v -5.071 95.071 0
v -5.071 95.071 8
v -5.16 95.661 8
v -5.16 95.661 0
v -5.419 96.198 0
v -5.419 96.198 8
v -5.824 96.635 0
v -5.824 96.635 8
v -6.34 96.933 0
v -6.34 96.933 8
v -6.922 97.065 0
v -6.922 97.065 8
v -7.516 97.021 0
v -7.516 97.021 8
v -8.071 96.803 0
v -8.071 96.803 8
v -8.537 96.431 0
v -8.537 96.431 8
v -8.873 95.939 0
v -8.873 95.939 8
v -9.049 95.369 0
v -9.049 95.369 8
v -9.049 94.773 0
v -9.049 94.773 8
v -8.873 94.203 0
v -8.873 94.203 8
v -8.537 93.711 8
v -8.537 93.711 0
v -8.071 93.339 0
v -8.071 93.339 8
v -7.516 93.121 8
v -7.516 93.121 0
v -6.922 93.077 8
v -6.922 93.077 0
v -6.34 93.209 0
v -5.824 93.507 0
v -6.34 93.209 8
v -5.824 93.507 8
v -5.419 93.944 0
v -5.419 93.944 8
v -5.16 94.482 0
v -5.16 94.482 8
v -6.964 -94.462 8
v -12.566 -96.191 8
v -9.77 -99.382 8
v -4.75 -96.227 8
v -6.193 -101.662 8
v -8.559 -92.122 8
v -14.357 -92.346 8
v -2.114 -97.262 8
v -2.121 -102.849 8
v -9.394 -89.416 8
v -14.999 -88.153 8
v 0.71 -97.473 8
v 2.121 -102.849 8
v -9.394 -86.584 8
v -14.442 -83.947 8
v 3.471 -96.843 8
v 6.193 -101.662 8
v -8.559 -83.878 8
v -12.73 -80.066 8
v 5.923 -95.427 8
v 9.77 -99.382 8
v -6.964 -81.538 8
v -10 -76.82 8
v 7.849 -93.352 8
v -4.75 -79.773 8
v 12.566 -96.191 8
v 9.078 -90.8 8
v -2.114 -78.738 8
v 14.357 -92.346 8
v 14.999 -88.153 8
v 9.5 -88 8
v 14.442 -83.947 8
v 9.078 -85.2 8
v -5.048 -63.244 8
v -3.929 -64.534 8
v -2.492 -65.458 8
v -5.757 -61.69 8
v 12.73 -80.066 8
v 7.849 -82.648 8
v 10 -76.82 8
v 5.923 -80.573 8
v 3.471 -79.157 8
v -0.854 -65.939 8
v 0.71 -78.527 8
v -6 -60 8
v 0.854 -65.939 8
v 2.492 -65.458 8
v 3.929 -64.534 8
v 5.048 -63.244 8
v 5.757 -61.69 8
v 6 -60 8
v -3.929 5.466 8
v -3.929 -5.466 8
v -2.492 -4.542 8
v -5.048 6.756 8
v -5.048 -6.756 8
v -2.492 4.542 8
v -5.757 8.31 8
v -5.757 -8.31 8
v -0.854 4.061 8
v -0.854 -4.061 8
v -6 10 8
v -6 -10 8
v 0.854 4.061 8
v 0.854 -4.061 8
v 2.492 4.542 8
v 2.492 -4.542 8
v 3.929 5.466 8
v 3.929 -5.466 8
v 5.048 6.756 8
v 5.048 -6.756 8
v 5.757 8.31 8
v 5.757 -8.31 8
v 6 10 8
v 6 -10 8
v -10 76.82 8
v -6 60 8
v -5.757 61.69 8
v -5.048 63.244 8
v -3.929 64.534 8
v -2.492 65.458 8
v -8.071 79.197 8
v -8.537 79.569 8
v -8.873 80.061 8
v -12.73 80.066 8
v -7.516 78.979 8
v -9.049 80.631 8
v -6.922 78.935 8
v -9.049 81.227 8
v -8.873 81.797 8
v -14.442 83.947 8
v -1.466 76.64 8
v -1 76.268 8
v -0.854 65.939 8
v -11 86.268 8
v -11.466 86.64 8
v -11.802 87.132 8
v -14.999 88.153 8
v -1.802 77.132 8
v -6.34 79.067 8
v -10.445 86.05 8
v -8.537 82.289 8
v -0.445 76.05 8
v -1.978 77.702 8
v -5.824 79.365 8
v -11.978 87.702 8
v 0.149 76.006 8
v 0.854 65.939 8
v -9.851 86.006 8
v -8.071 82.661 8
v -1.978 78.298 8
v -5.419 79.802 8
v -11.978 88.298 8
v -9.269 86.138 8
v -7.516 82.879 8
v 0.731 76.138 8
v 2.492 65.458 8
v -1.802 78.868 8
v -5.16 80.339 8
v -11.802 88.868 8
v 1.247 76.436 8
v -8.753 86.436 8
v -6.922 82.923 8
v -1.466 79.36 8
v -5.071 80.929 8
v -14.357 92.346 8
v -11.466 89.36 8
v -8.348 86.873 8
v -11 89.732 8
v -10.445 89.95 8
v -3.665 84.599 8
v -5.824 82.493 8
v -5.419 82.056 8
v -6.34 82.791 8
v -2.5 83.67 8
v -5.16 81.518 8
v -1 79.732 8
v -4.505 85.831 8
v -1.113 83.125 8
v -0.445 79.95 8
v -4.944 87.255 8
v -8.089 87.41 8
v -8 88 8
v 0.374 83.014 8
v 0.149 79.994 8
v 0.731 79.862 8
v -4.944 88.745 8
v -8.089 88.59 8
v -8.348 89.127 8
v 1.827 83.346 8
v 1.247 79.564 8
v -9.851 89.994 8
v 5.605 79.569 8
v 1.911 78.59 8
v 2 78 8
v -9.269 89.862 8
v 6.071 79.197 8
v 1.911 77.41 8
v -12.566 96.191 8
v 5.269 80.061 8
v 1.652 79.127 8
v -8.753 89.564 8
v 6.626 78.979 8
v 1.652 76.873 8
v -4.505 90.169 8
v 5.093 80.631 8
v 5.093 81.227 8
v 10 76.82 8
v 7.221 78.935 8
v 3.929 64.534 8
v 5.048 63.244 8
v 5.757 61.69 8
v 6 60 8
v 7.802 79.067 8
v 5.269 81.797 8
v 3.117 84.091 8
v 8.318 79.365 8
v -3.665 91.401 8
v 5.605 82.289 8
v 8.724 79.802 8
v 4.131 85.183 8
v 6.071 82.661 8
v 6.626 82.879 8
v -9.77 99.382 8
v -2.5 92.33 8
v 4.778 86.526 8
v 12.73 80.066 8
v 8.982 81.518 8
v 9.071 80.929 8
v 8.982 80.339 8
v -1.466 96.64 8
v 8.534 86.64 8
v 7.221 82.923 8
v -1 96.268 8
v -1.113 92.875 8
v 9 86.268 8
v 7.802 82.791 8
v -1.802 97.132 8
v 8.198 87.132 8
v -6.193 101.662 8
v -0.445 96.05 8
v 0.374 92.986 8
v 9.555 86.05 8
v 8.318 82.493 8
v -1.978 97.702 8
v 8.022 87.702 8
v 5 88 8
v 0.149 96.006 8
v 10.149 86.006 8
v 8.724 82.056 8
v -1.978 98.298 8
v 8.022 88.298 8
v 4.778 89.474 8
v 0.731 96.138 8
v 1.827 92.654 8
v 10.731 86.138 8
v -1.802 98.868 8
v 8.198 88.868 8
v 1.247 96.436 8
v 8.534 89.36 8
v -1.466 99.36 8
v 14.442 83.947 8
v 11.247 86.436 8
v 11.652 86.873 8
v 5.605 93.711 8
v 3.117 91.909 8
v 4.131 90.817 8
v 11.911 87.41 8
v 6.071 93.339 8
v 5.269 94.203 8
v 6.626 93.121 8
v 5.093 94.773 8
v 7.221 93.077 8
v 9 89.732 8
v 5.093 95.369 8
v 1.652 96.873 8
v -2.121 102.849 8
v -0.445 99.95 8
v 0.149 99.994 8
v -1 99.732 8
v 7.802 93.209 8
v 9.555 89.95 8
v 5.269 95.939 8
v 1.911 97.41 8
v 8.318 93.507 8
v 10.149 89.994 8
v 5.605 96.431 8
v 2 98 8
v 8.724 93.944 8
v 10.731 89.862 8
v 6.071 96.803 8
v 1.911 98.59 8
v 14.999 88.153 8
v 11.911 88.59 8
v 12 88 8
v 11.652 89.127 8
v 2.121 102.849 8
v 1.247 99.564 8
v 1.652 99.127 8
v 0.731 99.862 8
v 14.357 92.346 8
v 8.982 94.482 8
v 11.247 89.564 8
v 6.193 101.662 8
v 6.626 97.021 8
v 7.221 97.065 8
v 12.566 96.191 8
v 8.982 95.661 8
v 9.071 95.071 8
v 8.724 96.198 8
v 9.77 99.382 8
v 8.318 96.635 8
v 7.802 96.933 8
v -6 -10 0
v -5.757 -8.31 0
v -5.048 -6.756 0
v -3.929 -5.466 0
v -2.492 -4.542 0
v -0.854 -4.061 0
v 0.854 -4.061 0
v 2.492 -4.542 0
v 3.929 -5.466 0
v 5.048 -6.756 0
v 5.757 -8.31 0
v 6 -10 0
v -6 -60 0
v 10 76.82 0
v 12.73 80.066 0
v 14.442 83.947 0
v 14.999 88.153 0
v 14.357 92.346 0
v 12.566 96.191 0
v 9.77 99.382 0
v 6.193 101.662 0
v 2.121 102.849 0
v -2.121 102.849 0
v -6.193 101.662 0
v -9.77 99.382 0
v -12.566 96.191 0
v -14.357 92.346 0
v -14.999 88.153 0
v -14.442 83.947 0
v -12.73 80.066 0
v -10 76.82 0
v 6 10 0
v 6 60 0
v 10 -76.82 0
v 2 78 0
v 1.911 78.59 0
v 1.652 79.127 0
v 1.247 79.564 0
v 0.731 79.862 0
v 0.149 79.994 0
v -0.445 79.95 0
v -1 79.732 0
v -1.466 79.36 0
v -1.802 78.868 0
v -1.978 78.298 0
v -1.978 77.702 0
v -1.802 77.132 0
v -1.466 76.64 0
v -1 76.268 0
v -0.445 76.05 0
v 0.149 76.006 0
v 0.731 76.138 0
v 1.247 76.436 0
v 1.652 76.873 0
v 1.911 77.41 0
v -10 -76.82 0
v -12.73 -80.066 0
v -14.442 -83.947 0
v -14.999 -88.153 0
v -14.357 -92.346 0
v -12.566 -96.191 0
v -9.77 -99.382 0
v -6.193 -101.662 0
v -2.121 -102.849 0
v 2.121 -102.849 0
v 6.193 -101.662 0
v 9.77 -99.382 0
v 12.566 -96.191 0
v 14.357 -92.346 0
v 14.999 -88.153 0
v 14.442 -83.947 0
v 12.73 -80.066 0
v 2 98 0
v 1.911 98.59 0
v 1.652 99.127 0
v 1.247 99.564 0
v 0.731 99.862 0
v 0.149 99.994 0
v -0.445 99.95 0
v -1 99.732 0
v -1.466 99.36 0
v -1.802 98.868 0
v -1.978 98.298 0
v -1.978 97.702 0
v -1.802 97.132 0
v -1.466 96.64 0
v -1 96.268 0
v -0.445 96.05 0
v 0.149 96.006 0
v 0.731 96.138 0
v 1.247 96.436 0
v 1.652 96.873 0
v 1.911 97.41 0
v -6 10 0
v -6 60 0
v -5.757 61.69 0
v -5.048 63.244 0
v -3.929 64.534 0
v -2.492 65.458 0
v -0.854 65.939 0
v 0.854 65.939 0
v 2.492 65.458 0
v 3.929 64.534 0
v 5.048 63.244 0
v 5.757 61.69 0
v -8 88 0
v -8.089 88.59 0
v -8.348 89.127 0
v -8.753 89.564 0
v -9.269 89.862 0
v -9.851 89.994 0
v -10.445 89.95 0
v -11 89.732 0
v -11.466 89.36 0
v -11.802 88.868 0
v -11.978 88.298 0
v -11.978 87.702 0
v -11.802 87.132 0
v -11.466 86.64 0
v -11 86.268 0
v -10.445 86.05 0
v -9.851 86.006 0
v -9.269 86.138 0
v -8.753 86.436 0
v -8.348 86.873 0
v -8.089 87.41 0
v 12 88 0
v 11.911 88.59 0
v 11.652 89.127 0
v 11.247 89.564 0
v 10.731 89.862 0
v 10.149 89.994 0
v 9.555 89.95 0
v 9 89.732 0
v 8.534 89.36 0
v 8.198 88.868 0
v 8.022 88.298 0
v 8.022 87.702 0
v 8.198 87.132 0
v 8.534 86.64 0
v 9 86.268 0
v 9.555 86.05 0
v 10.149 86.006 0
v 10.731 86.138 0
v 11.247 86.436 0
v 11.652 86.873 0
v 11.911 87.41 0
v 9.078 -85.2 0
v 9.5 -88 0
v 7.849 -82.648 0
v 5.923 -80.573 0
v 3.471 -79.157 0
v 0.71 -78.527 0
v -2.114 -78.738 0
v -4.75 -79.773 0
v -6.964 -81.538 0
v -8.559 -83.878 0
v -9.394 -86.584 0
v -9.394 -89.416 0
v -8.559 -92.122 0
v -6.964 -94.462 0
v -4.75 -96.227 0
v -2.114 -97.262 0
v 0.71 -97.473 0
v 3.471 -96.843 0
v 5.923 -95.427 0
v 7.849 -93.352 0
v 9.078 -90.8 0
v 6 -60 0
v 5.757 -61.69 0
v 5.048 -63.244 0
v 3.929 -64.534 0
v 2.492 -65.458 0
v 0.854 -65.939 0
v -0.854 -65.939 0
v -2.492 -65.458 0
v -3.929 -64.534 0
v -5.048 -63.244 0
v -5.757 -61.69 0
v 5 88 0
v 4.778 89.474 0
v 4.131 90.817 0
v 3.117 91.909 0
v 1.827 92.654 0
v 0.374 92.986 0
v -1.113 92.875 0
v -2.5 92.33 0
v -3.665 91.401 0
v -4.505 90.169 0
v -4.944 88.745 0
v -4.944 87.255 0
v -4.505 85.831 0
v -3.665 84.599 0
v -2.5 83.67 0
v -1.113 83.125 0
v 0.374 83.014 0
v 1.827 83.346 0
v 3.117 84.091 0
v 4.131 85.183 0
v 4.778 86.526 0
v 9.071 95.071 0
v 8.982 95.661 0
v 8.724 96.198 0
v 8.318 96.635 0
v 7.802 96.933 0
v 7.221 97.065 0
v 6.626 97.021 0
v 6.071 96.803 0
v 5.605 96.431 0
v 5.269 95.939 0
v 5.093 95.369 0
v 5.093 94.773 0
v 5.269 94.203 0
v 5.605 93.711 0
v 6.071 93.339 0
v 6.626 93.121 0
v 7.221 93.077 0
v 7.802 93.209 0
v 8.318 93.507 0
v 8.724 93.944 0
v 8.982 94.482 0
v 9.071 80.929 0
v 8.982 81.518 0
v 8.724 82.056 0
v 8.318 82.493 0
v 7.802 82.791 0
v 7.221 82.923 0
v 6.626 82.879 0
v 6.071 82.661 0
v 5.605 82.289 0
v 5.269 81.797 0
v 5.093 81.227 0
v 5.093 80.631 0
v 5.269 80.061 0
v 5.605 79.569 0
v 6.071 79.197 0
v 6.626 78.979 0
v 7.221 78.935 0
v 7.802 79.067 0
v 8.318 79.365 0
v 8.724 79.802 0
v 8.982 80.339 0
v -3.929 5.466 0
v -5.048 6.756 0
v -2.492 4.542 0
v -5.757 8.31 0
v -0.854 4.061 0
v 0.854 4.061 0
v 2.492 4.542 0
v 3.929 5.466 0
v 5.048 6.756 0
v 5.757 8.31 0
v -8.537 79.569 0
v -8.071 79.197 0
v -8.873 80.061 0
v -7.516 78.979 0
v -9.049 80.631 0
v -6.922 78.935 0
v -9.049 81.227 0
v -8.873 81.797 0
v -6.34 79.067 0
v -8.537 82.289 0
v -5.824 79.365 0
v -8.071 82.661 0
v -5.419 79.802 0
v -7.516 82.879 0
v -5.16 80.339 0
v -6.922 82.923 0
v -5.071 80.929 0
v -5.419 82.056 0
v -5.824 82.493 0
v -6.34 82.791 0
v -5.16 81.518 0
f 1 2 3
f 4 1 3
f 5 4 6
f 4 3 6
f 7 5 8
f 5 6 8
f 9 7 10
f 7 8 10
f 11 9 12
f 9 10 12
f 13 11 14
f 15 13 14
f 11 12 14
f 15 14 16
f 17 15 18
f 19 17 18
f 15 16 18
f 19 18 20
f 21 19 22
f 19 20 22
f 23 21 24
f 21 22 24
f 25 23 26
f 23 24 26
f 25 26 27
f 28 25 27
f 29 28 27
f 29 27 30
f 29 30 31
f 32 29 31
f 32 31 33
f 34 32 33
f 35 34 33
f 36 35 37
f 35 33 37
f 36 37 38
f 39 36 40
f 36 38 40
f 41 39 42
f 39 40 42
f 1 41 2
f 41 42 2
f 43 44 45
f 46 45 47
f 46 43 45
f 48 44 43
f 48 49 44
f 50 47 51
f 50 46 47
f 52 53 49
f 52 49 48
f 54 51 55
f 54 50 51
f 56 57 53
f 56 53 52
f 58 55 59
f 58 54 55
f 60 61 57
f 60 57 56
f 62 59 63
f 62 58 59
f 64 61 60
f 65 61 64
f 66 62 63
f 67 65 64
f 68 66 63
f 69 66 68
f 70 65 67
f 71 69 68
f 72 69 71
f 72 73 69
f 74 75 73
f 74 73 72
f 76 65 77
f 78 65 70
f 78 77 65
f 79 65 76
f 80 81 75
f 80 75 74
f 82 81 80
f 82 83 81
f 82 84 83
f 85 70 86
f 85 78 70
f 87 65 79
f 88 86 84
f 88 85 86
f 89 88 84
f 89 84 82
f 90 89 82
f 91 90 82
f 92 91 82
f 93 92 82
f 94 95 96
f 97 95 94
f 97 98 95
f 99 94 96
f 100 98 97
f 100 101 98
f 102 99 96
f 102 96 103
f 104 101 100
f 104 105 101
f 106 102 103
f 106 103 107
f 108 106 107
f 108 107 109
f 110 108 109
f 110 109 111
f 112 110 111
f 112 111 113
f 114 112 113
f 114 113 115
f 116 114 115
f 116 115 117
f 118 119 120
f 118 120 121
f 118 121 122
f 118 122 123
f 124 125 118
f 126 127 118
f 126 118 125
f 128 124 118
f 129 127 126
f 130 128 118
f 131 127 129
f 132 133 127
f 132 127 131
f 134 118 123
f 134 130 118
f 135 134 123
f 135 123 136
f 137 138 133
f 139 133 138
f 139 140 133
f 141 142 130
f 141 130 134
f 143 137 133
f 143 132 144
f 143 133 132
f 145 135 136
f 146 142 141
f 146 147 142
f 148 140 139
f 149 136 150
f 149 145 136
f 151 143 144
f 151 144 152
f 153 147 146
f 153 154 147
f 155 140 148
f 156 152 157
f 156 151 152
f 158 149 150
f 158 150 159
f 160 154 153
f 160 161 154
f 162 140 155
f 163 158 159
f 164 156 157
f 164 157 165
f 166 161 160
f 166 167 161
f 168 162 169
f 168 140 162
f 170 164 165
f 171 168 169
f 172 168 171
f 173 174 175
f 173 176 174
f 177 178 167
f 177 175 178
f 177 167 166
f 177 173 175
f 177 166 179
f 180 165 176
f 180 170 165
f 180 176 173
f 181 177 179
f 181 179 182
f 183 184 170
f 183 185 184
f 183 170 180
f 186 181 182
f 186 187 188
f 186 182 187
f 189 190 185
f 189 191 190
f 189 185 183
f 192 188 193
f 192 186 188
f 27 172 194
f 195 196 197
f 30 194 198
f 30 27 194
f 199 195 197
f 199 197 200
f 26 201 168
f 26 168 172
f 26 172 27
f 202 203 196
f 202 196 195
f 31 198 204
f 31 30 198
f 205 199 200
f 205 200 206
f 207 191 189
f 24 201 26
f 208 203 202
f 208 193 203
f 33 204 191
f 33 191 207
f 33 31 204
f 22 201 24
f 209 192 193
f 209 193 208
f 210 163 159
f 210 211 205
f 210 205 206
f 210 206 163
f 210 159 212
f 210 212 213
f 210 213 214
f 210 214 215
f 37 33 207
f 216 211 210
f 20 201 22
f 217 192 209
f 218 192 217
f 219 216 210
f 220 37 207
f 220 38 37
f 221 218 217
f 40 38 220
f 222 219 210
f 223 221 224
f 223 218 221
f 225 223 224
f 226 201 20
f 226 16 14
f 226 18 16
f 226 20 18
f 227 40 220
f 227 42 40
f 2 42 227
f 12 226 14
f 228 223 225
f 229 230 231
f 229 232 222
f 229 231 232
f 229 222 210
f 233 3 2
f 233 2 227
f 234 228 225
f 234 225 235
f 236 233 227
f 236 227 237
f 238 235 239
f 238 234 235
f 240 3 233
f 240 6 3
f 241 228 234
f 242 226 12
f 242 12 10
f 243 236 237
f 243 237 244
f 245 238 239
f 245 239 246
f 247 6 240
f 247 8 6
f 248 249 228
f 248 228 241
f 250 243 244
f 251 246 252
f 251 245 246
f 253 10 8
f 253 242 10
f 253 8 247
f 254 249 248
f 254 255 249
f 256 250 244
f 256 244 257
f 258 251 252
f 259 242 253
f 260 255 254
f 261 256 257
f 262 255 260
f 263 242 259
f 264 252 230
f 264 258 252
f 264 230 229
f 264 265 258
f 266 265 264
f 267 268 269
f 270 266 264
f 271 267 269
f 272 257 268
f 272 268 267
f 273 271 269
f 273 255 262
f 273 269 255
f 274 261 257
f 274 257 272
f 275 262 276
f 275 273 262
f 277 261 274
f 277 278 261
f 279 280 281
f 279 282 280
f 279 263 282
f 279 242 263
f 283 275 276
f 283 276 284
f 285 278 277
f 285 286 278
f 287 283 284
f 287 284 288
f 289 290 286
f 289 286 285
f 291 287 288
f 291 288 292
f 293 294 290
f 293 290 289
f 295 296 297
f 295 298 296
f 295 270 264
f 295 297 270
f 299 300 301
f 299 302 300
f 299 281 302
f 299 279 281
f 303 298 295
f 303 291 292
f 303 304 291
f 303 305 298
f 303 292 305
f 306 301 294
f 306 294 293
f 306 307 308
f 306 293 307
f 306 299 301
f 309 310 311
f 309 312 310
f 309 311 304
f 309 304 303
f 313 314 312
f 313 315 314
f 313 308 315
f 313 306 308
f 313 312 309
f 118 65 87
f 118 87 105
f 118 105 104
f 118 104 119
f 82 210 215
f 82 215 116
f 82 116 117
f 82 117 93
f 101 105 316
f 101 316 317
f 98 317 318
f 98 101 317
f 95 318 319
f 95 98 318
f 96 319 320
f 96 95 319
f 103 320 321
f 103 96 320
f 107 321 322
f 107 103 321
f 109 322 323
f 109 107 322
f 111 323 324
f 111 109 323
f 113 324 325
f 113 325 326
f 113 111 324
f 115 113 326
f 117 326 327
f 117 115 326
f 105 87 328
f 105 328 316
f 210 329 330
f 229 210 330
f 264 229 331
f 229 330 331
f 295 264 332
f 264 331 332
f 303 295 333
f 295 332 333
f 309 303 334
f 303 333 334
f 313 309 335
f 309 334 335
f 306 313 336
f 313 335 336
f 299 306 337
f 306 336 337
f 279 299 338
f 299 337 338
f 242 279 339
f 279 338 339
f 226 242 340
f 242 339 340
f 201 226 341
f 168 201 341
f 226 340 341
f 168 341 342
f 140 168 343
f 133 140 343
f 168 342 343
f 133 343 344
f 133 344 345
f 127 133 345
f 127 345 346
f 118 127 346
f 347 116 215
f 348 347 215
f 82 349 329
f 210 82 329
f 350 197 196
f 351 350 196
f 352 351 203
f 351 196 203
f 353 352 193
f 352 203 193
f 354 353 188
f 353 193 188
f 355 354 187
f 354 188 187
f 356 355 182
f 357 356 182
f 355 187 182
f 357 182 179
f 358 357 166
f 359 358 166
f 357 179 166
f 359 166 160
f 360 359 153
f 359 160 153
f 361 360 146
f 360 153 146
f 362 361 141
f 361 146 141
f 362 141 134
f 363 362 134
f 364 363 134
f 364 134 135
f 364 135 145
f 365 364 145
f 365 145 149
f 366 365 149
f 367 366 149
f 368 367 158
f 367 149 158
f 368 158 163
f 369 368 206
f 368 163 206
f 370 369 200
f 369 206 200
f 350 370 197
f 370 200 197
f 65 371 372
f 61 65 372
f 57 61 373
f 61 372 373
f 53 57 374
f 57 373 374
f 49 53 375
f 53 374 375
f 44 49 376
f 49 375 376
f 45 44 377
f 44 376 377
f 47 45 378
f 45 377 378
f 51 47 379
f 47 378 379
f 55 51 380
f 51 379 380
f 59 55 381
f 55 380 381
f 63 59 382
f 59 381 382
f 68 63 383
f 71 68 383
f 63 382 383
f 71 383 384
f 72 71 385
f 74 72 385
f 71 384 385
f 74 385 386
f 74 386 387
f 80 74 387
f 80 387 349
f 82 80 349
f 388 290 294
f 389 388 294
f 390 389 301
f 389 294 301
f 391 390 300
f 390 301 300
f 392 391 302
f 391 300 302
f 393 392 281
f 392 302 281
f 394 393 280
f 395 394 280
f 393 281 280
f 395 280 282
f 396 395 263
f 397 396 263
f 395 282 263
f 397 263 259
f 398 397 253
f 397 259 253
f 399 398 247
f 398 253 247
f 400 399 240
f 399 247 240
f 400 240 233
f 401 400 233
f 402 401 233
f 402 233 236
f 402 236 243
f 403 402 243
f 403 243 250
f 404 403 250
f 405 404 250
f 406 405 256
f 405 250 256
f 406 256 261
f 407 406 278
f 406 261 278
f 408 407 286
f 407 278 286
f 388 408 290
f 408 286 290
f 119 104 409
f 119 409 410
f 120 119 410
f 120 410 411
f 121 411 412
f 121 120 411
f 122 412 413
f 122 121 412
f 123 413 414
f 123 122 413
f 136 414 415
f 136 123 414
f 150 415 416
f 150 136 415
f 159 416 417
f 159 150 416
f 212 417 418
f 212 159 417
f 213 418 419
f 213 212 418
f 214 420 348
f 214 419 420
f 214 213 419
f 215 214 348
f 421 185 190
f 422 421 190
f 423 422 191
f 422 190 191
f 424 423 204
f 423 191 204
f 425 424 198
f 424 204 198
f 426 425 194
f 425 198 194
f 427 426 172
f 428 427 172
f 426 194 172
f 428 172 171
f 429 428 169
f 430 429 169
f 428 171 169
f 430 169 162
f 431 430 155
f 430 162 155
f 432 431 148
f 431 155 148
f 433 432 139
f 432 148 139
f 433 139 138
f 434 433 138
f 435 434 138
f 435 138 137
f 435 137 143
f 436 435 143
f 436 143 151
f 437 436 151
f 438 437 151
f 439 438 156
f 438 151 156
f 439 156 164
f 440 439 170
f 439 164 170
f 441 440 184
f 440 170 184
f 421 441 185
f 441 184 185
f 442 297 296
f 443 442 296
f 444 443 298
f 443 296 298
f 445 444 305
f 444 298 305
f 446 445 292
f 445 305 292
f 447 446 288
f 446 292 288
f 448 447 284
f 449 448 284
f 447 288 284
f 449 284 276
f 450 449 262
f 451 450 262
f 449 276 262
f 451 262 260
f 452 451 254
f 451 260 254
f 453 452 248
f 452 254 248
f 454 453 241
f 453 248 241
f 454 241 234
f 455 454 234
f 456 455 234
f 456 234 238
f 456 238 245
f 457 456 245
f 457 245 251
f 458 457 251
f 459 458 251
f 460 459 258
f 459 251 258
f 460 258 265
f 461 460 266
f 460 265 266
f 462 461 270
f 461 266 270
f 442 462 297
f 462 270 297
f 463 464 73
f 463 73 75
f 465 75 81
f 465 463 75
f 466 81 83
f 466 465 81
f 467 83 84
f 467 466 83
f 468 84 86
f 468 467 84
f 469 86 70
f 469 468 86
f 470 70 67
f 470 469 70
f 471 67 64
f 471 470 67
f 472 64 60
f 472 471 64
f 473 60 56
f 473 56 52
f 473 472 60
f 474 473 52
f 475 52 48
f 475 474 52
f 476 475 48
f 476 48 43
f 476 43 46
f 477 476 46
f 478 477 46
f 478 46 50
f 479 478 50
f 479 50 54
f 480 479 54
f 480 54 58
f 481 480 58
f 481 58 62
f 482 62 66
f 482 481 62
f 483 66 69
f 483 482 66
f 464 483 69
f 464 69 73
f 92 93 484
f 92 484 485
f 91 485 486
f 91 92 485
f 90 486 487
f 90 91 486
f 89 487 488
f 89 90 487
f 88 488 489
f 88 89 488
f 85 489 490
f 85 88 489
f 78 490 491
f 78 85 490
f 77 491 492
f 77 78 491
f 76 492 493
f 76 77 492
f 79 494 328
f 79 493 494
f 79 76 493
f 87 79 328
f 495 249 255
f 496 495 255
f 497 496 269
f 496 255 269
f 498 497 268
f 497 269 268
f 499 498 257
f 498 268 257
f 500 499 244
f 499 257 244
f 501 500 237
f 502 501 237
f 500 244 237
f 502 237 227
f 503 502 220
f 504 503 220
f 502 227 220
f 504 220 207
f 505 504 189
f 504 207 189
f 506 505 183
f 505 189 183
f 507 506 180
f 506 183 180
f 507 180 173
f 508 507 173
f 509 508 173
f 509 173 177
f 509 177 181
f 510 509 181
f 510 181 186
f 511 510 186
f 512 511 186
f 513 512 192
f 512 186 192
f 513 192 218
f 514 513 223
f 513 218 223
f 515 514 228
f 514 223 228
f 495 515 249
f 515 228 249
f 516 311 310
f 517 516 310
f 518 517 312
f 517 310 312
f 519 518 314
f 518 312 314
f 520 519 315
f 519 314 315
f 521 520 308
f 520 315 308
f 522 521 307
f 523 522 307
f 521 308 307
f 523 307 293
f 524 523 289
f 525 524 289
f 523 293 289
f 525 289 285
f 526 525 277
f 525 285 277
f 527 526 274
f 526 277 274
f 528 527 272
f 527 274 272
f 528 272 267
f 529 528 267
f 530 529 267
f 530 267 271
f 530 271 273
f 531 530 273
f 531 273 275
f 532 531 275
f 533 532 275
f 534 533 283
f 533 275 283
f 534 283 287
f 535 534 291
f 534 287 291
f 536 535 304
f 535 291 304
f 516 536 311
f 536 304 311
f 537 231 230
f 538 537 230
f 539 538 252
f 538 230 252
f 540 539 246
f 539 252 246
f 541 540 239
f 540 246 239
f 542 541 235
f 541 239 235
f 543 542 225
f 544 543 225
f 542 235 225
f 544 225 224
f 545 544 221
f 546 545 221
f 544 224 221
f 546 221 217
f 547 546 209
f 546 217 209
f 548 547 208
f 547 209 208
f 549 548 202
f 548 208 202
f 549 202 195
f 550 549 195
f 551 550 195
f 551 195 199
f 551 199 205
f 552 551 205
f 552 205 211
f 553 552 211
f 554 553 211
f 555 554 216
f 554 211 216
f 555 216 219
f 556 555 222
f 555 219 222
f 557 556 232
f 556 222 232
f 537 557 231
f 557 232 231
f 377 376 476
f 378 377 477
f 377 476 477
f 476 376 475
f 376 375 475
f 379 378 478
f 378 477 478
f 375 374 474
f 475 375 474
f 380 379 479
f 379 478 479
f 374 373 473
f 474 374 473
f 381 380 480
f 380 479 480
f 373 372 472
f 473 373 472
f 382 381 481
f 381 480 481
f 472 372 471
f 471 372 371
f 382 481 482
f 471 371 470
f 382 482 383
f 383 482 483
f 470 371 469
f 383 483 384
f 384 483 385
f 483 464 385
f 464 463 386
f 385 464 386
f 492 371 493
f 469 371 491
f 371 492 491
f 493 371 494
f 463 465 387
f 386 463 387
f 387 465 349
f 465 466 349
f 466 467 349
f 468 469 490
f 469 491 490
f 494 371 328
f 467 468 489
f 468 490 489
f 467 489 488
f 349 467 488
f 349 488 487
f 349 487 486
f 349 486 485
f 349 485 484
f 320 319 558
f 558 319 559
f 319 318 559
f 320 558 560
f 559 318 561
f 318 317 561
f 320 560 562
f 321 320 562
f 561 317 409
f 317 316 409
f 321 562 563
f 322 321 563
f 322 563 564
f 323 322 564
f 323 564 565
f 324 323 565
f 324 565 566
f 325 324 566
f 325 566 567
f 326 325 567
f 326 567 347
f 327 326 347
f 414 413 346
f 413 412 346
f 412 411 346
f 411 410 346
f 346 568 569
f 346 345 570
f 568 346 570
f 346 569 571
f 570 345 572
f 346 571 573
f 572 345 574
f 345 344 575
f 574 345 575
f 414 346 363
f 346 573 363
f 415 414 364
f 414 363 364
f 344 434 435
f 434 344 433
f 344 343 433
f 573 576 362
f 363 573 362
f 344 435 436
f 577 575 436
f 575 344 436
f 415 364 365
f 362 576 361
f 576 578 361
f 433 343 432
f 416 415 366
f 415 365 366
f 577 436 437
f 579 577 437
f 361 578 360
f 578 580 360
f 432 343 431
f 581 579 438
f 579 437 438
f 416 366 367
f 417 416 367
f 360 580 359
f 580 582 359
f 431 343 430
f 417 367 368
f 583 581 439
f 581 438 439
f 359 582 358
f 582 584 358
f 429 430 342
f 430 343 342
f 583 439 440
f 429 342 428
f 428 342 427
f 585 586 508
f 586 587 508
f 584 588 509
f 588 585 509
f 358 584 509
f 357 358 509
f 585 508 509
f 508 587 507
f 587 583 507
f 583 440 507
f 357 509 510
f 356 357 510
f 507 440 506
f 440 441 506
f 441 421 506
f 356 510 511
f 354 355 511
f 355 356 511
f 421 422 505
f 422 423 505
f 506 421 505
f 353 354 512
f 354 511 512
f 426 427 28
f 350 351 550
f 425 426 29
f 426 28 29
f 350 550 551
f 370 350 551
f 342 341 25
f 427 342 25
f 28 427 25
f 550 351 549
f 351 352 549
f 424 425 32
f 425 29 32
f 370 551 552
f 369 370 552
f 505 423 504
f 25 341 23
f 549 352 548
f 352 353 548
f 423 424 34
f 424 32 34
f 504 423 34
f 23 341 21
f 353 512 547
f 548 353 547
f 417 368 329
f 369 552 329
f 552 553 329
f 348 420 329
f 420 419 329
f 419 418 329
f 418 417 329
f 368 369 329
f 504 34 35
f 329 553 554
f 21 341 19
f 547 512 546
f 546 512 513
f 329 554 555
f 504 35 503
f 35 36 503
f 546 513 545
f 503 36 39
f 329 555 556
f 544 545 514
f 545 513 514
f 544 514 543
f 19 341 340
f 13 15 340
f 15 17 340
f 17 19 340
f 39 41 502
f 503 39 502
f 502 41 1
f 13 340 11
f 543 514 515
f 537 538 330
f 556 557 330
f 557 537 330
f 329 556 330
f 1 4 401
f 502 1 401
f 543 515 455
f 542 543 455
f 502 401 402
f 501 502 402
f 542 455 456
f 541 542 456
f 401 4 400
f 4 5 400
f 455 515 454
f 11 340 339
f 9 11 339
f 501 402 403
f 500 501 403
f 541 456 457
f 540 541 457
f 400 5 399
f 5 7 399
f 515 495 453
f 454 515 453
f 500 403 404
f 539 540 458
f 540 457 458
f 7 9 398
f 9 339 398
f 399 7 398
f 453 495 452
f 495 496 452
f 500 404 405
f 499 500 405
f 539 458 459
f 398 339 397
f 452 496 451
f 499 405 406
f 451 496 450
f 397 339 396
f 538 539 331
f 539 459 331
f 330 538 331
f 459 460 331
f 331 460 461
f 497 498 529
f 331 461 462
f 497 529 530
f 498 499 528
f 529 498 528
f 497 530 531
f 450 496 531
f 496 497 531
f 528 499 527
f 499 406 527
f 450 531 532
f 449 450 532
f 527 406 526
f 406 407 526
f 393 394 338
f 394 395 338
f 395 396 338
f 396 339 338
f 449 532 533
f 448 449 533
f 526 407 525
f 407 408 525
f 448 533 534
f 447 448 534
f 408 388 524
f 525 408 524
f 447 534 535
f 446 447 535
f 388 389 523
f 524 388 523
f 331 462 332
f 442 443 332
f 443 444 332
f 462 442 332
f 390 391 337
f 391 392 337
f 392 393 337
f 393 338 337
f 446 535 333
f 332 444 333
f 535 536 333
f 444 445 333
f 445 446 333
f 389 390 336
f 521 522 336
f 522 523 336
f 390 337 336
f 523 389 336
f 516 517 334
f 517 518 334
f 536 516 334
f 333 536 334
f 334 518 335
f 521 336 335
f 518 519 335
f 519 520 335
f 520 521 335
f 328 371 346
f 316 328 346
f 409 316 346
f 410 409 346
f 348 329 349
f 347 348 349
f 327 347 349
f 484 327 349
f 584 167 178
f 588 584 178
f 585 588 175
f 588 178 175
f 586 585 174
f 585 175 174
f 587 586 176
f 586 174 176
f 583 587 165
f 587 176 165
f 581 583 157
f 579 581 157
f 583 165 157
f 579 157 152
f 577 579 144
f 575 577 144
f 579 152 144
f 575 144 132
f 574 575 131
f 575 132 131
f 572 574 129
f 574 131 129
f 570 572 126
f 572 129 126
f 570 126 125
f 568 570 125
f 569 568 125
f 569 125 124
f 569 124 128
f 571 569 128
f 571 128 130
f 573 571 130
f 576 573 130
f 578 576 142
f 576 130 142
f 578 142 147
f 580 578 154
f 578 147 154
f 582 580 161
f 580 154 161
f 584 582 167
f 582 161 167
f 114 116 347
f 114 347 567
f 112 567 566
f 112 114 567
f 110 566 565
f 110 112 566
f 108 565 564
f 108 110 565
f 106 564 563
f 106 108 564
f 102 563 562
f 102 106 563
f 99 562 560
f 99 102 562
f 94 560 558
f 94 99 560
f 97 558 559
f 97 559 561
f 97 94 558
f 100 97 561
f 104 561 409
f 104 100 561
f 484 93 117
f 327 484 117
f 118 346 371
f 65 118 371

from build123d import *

# Parameters (mm, degrees)
SKETCH_1_R          = 9.5
EXTRUDE_1_DEPTH     = 8
SKETCH_3_R          = 2
CUT_EXTRUDE_2_DEPTH = 8
SKETCH_4_R          = 5
CUT_EXTRUDE_3_DEPTH = 8
SKETCH_5_W          = 12
SKETCH_5_H          = 120
CUT_EXTRUDE_4_DEPTH = 10
EXTRUDE_2_DEPTH     = 8


with BuildPart() as part:
    # 草图1 → 凸台-拉伸1 (new body)
    with BuildSketch(Plane.XY):
        with BuildLine():
            Line((-10, 76.819660113), (-10, -76.819660113))
            ThreePointArc((-10, -76.819660113), (0, -103), (10, -76.819660113))
            Line((10, -76.819660113), (10, 76.819660113))
            ThreePointArc((10, 76.819660113), (0, 103), (-10, 76.819660113))
        make_face()
        with Locations((0, -88)):
            Circle(SKETCH_1_R, mode=Mode.SUBTRACT)
    extrude(amount=EXTRUDE_1_DEPTH)

    # 草图3 → 切除-拉伸2 (cut)
    with BuildSketch(Plane.XY.offset(8)):
        with Locations((0, 98)):
            Circle(SKETCH_3_R)
        with Locations((10, 88)):
            Circle(SKETCH_3_R)
        with Locations((0, 78)):
            Circle(SKETCH_3_R)
        with Locations((-10, 88)):
            Circle(SKETCH_3_R)
        with Locations((7.071067812, 95.071067812)):
            Circle(SKETCH_3_R)
        with Locations((7.071067812, 80.928932188)):
            Circle(SKETCH_3_R)
        with Locations((-7.071067812, 80.928932188)):
            Circle(SKETCH_3_R)
        with Locations((-7.071067812, 95.071067812)):
            Circle(SKETCH_3_R)
    extrude(amount=-CUT_EXTRUDE_2_DEPTH, mode=Mode.SUBTRACT)

    # 草图4 → 切除-拉伸3 (cut)
    with BuildSketch(Plane.XY.offset(8)):
        with Locations((0, 88)):
            Circle(SKETCH_4_R)
    extrude(amount=-CUT_EXTRUDE_3_DEPTH, mode=Mode.SUBTRACT)

    # 草图5 → 切除-拉伸4 (cut)
    with BuildSketch(Plane.XY.offset(8)):
        with BuildLine():
            ThreePointArc((-6, 60), (0, 66), (6, 60))
            Line((6, 60), (-6, 60))
        make_face()
        Rectangle(SKETCH_5_W, SKETCH_5_H)
        with BuildLine():
            Line((-6, -60), (6, -60))
            ThreePointArc((6, -60), (0, -66), (-6, -60))
        make_face()
    extrude(amount=-CUT_EXTRUDE_4_DEPTH, mode=Mode.SUBTRACT)

    # 草图6 → 凸台-拉伸2 (add)
    with BuildSketch(Plane.XY.offset(8)):
        with BuildLine():
            Line((-6, 10), (-6, -10))
            ThreePointArc((-6, -10), (0, -4), (6, -10))
            Line((6, -10), (6, 10))
            ThreePointArc((6, 10), (0, 4), (-6, 10))
        make_face()
    extrude(amount=-EXTRUDE_2_DEPTH)


solid = part.part
